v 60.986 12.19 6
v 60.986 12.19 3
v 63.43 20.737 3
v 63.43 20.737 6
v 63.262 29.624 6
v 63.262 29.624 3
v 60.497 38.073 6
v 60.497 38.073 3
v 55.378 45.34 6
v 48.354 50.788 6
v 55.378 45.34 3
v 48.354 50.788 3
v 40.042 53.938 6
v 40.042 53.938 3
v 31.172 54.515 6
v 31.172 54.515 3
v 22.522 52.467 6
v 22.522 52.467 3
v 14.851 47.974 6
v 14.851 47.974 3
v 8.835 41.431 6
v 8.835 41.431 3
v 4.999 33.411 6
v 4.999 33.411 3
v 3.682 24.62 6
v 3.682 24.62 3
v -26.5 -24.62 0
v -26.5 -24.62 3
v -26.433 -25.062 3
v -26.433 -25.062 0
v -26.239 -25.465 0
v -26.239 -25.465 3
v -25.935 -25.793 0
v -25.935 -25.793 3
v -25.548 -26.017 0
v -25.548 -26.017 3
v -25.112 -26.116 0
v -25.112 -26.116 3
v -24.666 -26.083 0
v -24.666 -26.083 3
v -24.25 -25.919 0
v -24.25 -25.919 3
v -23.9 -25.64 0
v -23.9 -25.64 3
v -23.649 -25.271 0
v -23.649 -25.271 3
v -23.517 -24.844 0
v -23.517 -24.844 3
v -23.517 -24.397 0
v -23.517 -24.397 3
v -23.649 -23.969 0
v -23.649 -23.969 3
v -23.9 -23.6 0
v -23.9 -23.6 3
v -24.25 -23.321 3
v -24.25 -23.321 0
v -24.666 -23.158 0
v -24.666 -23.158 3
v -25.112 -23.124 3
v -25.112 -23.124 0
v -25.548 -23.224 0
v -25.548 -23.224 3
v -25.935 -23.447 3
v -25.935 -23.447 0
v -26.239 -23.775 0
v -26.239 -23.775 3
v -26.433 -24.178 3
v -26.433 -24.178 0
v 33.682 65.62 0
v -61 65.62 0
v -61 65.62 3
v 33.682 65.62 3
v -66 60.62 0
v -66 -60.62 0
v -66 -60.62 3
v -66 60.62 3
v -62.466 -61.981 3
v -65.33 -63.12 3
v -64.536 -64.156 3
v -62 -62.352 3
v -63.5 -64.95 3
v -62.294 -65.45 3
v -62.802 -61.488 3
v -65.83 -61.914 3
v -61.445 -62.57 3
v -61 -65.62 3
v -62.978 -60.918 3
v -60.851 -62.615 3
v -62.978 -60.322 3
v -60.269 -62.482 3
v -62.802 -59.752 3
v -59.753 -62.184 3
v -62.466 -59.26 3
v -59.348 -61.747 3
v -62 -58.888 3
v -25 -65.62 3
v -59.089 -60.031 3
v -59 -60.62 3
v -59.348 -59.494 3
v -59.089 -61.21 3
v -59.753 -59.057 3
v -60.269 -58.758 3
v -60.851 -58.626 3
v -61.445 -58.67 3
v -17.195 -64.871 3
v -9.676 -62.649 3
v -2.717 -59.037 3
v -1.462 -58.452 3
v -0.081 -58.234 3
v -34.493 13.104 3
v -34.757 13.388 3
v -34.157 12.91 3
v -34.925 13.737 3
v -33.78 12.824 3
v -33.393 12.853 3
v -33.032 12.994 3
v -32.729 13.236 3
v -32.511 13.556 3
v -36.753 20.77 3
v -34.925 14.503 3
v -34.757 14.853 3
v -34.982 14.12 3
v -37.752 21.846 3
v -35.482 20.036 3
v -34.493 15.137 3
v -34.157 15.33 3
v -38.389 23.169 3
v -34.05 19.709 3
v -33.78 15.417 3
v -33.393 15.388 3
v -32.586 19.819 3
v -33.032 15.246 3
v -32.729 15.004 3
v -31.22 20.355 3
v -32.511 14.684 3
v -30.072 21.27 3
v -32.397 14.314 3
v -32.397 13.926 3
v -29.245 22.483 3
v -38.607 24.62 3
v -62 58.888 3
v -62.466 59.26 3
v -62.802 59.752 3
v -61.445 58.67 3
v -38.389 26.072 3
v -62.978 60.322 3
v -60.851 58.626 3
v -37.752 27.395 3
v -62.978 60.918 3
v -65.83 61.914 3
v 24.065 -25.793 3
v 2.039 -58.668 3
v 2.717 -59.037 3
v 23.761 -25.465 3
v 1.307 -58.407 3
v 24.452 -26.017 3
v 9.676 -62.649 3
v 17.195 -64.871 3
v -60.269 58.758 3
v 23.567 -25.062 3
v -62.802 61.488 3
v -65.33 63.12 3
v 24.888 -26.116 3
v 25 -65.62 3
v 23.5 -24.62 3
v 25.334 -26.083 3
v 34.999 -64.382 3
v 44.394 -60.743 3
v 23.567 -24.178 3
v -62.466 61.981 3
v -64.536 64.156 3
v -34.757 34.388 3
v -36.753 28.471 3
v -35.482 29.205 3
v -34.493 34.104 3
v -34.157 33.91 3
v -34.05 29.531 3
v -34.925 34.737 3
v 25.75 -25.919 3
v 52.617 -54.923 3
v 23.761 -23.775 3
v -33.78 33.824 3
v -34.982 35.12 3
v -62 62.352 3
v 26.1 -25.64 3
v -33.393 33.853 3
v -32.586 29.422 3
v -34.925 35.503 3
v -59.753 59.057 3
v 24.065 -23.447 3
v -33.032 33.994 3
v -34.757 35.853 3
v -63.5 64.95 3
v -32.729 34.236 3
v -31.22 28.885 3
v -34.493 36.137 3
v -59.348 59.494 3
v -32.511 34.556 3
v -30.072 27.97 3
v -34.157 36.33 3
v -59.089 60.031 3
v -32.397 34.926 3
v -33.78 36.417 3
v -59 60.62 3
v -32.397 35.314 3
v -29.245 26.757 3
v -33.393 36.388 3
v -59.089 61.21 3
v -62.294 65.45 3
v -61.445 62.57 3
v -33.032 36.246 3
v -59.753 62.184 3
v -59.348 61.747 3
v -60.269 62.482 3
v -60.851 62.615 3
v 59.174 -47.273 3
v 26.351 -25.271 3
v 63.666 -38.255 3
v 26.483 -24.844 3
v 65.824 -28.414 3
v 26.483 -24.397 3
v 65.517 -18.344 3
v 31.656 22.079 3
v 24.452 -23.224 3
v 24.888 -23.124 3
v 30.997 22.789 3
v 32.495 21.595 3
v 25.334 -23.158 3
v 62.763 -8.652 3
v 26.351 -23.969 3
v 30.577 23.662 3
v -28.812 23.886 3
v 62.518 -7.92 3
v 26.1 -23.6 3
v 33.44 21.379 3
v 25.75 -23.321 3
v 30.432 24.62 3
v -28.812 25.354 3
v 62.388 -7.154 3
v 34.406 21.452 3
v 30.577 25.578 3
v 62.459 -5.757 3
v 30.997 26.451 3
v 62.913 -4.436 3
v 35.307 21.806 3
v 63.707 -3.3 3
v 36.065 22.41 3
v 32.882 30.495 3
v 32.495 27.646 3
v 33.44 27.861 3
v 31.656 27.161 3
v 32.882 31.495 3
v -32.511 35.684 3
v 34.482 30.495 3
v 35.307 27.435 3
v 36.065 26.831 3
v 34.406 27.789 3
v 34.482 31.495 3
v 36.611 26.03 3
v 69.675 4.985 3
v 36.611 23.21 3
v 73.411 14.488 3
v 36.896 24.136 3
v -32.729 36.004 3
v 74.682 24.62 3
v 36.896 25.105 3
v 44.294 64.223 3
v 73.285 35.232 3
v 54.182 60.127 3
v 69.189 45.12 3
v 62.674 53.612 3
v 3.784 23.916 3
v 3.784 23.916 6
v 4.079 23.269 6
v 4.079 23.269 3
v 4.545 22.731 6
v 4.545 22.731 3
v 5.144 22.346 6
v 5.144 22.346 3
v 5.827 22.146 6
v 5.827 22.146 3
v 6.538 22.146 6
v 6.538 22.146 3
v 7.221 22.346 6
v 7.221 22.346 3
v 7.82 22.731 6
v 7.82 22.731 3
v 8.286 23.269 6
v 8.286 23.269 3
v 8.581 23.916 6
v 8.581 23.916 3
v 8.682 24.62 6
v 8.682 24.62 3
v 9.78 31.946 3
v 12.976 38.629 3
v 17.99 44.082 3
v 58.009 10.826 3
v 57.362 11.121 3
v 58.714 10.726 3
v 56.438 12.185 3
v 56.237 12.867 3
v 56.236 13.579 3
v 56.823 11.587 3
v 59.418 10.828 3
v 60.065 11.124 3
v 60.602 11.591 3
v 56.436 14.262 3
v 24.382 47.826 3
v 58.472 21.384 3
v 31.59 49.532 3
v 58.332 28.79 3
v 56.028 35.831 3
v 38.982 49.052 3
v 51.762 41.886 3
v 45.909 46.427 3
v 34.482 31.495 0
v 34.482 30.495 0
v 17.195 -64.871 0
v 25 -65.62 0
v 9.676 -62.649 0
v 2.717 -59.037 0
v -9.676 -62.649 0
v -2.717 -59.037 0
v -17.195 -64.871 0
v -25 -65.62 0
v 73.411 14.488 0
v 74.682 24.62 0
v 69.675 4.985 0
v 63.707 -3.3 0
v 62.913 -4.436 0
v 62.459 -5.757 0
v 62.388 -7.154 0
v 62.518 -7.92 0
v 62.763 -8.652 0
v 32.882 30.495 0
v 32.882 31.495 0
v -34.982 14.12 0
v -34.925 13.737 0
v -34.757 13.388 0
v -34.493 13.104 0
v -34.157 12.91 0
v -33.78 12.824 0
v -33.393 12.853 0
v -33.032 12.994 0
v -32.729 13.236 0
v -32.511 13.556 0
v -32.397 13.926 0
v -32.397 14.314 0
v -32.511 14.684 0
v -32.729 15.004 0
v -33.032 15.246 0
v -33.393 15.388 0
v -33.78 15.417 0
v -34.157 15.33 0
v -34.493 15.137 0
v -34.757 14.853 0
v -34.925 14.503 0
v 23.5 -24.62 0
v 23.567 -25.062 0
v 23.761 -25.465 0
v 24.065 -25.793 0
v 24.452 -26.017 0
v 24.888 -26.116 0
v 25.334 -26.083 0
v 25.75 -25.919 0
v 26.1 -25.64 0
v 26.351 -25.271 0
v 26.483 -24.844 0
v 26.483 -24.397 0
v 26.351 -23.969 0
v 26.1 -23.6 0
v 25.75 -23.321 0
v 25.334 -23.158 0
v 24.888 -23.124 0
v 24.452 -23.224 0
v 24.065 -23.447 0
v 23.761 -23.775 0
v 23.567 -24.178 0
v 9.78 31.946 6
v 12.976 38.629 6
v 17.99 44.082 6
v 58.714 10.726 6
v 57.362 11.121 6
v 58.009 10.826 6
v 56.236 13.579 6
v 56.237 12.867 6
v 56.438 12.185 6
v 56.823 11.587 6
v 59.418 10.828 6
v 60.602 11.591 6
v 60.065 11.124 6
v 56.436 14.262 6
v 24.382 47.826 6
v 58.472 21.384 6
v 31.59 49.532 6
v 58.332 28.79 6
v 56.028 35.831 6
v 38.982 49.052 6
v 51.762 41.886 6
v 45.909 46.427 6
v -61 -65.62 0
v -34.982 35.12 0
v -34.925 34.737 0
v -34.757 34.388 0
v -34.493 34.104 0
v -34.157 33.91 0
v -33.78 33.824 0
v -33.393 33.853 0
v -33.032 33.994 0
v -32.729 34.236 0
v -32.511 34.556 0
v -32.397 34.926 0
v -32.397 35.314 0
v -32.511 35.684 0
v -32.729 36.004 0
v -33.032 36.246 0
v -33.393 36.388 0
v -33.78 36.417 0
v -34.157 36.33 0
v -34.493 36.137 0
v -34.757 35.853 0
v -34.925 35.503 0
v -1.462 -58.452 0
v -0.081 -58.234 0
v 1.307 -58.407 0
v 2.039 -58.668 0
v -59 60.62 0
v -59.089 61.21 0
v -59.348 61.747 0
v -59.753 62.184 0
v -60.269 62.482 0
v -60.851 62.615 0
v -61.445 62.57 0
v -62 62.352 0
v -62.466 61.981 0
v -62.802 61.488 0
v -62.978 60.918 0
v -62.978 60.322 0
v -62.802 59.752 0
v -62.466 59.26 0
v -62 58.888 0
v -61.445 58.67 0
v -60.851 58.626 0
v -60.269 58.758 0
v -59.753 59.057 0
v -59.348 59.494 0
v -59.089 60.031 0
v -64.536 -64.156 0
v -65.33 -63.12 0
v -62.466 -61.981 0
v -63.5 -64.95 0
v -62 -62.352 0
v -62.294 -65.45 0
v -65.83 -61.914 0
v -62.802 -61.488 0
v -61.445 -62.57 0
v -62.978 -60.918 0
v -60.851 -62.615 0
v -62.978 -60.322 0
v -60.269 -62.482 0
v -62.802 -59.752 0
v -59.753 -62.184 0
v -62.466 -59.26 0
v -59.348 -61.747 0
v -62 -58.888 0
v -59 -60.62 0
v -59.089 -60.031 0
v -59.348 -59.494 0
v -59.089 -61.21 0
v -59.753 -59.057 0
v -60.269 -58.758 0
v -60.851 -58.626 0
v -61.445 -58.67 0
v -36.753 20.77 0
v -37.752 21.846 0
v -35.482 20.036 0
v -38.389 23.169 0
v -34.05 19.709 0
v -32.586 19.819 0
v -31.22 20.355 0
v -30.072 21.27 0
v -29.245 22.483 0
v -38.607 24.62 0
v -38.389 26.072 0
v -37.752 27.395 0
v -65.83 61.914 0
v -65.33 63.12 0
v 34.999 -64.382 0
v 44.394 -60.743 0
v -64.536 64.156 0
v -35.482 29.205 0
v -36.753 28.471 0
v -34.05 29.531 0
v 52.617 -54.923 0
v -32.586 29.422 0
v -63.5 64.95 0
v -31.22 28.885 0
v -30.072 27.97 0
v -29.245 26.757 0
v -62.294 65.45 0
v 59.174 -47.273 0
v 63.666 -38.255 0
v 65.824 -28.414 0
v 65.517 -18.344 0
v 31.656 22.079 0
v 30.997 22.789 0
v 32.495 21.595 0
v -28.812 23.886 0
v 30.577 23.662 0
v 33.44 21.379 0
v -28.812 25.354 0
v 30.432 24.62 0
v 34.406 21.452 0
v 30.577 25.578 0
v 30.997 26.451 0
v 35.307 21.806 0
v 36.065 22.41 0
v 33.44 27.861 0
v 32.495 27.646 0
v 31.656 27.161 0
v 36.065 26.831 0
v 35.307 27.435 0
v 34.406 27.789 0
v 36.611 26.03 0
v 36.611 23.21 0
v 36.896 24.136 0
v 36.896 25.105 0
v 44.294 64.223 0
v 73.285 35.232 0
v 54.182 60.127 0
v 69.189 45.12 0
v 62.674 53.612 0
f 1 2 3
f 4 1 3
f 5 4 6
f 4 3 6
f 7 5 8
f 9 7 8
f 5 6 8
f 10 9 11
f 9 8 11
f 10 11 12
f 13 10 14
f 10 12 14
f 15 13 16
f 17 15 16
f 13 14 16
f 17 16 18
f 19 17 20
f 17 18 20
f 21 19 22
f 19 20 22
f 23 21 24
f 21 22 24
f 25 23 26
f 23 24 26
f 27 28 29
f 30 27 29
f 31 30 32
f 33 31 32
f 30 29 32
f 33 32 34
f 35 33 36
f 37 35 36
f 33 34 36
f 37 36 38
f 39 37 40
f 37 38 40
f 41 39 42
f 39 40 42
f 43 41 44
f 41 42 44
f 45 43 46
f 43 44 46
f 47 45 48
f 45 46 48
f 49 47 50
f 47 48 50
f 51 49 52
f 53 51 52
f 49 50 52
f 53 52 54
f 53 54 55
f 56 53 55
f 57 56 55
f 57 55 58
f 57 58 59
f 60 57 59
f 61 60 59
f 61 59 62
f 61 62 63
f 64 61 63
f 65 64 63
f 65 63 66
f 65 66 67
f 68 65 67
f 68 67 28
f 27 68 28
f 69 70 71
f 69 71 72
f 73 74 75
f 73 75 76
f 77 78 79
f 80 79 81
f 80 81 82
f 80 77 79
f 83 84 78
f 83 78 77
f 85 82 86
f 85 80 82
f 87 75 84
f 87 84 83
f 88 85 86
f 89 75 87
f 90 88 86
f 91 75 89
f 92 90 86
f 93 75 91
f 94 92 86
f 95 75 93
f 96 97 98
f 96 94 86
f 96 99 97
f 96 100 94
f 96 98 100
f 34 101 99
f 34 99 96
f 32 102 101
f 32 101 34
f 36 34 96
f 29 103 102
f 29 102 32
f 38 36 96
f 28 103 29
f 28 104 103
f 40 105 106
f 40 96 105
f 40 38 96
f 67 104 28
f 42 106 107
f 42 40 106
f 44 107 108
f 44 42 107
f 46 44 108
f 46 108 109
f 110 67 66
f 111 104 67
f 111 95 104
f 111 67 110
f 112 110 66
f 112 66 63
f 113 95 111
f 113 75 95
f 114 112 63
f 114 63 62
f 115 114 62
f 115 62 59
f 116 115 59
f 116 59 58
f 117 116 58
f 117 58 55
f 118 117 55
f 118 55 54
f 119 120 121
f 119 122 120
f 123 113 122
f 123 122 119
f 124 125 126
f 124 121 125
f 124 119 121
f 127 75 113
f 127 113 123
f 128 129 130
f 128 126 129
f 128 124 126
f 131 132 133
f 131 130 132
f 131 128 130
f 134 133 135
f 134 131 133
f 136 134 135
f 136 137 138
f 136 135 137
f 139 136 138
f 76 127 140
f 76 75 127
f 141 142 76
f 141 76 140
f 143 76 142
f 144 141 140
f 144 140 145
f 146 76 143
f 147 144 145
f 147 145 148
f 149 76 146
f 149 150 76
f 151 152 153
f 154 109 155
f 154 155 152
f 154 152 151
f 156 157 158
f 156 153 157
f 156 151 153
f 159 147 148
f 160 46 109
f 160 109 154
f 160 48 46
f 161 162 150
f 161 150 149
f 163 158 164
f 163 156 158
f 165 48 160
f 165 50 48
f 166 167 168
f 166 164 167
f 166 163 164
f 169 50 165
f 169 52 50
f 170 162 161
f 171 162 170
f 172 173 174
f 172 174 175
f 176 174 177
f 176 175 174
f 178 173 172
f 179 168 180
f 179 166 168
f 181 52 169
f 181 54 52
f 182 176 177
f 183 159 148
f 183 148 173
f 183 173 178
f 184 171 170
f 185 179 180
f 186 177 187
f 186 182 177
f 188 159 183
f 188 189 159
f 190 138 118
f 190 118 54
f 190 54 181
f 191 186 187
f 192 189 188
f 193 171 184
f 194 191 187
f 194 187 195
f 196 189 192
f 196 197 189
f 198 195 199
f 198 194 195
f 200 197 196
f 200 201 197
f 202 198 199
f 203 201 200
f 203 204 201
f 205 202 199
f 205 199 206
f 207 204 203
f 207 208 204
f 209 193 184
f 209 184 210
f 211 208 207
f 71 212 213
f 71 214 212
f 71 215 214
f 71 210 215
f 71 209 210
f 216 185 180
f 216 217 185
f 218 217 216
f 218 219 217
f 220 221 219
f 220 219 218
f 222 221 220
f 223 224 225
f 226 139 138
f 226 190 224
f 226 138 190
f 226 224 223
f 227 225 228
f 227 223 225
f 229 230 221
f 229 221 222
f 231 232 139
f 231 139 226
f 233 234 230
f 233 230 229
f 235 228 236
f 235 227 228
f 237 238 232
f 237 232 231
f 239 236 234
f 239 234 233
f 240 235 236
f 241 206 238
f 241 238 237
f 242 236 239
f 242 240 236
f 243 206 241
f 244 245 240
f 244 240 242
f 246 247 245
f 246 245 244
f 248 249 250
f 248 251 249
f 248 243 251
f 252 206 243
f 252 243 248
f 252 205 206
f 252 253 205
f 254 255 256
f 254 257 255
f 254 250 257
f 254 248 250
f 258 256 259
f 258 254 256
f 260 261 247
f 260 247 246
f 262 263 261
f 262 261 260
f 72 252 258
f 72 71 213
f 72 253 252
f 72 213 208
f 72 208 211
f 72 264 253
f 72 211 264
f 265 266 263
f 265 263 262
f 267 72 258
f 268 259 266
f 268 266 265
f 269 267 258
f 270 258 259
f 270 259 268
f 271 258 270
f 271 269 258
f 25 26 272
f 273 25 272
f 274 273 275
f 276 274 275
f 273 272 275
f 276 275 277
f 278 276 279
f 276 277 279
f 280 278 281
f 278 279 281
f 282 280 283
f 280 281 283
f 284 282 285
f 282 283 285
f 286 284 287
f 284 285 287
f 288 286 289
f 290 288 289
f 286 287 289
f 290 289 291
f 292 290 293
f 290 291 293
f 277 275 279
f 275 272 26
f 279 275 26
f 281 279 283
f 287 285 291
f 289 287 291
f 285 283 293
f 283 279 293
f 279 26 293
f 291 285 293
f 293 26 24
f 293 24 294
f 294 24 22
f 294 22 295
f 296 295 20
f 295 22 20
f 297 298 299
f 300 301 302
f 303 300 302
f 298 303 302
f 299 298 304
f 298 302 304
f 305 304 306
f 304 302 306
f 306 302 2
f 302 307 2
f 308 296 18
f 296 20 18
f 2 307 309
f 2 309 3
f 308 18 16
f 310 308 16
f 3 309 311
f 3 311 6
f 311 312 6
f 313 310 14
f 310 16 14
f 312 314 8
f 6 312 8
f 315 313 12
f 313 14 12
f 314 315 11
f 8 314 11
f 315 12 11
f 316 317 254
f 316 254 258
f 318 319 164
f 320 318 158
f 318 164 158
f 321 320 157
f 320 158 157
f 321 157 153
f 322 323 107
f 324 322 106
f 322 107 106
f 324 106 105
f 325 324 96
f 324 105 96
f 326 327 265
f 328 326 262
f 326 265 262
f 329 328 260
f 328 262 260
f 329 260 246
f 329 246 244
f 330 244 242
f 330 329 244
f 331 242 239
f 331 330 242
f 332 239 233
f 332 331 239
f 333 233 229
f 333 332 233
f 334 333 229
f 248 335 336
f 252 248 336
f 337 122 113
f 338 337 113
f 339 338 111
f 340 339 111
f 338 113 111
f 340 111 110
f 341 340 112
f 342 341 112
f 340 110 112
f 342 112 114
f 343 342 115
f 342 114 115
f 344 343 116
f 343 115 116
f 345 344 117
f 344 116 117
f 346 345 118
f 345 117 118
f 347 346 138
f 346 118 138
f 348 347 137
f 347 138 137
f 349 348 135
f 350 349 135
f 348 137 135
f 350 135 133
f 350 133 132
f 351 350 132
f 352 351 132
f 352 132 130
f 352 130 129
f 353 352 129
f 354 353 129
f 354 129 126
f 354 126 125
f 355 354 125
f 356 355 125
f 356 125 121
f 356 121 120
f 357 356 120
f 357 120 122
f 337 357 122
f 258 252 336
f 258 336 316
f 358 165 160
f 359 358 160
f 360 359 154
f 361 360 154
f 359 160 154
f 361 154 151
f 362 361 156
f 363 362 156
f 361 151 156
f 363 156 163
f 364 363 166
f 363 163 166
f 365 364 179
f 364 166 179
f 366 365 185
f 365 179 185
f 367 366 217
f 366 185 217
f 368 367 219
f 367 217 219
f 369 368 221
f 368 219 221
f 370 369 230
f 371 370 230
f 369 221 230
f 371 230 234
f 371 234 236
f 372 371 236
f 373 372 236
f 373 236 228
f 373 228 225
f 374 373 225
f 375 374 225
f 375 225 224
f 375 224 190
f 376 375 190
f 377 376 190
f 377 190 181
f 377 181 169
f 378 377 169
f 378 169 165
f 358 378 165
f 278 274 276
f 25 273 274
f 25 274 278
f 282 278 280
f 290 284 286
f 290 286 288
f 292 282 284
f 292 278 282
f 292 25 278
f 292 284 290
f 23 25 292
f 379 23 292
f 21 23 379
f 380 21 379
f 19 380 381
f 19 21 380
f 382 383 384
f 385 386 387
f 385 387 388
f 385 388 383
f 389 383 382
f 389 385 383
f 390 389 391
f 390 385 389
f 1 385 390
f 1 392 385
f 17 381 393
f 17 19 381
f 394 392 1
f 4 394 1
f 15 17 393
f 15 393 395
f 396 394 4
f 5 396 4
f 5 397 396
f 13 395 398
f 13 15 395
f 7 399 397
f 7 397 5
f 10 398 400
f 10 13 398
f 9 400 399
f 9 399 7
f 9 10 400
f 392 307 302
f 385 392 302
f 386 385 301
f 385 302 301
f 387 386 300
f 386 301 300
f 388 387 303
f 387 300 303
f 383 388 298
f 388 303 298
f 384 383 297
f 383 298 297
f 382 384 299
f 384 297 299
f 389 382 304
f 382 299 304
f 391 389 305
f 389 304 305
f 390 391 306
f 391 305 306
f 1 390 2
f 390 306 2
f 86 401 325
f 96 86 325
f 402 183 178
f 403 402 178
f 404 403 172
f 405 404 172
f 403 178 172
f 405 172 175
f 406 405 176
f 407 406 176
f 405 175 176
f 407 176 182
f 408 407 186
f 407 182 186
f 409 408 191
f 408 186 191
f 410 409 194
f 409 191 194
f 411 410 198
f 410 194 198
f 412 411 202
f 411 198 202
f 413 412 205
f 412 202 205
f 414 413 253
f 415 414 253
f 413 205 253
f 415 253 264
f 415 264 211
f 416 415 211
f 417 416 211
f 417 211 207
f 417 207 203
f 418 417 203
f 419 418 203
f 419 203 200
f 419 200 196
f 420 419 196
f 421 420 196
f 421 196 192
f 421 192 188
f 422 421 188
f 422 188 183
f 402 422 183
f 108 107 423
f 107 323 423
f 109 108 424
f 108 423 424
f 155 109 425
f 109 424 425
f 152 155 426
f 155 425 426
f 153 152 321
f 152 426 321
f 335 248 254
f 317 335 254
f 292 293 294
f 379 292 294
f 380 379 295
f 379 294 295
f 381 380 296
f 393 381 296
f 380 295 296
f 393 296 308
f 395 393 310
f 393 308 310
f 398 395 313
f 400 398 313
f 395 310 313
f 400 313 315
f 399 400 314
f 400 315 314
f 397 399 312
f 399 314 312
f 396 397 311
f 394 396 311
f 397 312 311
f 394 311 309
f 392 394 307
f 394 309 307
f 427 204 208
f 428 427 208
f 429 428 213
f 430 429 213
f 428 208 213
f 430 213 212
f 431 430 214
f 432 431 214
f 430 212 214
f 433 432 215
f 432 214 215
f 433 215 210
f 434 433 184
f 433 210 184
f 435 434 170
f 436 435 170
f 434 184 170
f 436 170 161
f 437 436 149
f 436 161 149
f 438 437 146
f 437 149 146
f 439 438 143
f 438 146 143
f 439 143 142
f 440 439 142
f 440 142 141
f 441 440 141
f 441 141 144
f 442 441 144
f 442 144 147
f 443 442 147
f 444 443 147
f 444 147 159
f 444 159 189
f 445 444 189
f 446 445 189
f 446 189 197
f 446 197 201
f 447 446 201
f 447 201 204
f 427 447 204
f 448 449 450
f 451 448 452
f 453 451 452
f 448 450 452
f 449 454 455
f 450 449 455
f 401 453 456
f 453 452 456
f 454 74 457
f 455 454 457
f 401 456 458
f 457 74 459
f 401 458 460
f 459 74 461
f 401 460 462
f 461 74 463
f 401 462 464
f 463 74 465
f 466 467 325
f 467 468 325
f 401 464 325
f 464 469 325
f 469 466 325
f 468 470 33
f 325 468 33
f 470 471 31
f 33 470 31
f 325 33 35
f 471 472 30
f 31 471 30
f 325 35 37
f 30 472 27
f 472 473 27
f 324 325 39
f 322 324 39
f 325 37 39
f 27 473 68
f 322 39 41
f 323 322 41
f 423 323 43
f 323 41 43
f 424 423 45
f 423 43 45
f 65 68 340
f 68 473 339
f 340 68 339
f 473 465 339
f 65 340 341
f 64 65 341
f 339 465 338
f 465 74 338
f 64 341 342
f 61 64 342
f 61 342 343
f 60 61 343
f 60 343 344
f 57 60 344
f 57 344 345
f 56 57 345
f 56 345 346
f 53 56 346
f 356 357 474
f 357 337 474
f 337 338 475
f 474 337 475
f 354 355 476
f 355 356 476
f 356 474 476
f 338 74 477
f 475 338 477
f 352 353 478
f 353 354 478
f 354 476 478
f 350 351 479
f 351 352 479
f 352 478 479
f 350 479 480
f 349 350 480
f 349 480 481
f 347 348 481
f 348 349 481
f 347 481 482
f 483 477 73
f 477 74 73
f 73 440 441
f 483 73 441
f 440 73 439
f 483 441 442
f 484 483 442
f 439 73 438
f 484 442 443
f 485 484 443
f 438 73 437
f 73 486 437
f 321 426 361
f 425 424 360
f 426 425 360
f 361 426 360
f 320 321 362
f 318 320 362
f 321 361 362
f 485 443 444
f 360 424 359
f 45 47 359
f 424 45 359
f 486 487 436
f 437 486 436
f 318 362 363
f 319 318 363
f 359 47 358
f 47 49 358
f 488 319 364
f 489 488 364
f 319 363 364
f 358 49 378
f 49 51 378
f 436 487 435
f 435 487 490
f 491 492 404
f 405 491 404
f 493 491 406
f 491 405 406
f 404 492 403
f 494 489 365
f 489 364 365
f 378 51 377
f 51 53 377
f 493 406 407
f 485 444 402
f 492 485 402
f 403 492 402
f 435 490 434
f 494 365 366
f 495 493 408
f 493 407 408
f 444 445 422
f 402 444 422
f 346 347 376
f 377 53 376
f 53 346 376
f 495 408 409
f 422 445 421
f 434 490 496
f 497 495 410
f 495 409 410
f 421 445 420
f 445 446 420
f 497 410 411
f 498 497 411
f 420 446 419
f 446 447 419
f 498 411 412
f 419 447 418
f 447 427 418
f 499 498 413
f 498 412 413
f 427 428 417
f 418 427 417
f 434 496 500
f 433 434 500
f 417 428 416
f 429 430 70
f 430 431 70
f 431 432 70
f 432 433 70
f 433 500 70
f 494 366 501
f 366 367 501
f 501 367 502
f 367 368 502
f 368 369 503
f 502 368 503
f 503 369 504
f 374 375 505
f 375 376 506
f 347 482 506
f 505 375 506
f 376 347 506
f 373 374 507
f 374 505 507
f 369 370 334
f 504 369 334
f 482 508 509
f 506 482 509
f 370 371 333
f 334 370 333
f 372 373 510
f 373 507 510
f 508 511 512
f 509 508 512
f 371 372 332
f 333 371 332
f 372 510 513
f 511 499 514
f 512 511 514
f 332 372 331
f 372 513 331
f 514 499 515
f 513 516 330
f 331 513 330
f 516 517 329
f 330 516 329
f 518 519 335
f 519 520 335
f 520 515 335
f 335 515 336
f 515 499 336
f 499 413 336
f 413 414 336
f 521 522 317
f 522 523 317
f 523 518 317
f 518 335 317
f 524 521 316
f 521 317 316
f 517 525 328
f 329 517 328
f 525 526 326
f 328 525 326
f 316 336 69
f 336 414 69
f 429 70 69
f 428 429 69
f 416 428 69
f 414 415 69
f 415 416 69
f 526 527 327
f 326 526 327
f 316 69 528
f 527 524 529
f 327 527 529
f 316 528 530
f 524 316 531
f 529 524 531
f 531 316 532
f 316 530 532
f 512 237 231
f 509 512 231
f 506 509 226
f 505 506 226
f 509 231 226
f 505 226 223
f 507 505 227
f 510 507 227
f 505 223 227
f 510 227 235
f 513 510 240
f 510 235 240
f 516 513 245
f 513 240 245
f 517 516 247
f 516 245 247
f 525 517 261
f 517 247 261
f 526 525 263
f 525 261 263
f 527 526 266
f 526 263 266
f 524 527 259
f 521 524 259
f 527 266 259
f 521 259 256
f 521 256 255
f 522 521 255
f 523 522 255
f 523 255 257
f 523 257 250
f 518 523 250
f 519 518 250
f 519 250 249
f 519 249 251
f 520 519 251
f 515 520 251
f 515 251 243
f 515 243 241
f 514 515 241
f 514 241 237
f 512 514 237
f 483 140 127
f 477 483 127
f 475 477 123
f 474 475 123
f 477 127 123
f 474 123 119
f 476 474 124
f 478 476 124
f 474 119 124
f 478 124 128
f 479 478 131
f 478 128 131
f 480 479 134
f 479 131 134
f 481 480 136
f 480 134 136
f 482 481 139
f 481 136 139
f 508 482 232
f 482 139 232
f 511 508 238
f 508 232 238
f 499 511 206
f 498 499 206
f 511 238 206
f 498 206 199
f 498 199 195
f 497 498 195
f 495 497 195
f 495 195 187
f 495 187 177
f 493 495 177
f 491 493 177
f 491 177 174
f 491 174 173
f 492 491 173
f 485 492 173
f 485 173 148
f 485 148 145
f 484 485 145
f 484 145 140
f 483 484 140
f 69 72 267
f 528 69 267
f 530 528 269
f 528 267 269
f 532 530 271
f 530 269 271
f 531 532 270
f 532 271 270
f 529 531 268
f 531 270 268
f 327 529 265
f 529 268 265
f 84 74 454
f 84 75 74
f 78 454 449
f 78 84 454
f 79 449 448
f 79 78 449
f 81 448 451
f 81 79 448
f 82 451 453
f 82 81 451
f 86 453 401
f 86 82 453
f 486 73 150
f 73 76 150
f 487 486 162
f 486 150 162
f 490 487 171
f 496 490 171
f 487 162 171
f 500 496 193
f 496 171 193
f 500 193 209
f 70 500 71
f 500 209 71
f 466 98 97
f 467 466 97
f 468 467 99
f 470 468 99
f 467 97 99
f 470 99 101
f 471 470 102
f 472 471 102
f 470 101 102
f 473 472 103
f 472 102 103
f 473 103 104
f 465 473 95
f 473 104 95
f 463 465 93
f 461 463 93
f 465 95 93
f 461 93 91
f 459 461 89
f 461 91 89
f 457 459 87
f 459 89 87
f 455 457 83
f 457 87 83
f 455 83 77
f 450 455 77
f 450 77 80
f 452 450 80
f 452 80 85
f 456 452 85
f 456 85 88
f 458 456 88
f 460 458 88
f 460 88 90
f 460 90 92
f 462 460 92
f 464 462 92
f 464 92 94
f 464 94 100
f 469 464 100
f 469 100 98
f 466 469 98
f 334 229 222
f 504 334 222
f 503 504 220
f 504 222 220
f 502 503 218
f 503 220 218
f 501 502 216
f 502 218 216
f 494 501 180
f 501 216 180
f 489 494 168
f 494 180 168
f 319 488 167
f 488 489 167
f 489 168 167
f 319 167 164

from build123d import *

# Parameters (mm, degrees)
F3_W      = 140.6824088833
F3_H      = 131.2403876506
F3_W_2    = 1.6
F3_H_2    = 1
F4_DEPTH  = 3
F5_D      = 9.85
F6_D      = 6.5
F7_D      = 2.6
F8_D      = 3
F9_R      = 2
F10_DEPTH = 3.001
F11_R     = 5
F13_DEPTH = 3


with BuildPart() as f4:
    # F3 (on Top) → F4 (new body)
    with BuildSketch(Plane.XY):
        with Locations((4.3412044417, 0)):
            Rectangle(F3_W, F3_H)
        with Locations((33.6824088833, 30.9951938253)):
            Rectangle(F3_W_2, F3_H_2, mode=Mode.SUBTRACT)
    extrude(amount=F4_DEPTH)

    # F5 (through all)
    with Locations(Plane(origin=(0, 0, 0), x_dir=(1, 0, 0), z_dir=(0, 0, -1))):
        with Locations((-33.6824088833, -24.6201938253)):
            Hole(F5_D / 2)

    # F6 (through all)
    with Locations(Plane(origin=(0, 0, 0), x_dir=(1, 0, 0), z_dir=(0, 0, -1))):
        with Locations((33.6824088833, -24.6201938253)):
            Hole(F6_D / 2)

    # F7 (through all)
    with Locations(Plane(origin=(0, 0, 0), x_dir=(1, 0, 0), z_dir=(0, 0, -1))):
        with Locations((-33.6824088833, -14.1201938253), (-33.6824088833, -35.1201938253)):
            Hole(F7_D / 2)

    # F8 (through all)
    with Locations(Plane(origin=(0, 0, 0), x_dir=(1, 0, 0), z_dir=(0, 0, -1))):
        with Locations((-25, 24.6201938253), (25, 24.6201938253)):
            Hole(F8_D / 2)

    # F9 (on face) → F10 (cut, through all)
    with BuildSketch(Plane.XY.offset(3)):
        with BuildLine():
            ThreePointArc((33.6824088833, 65.6201938253), (62.6737868311, 53.6115719349), (74.6824088833, 24.6201940542))
            Line((74.6824088833, 24.6201940542), (74.6824088833, 65.6201938253))
            Line((74.6824088833, 65.6201938253), (33.6824088833, 65.6201938253))
        make_face()
        with BuildLine():
            ThreePointArc((61.3436684683, -5.642897857), (60.0647196959, -45.8679097649), (25, -65.6201938253))
            Line((25, -65.6201938253), (74.6824088833, -65.6201938253))
            Line((74.6824088833, -65.6201938253), (74.6824088833, 24.6201940542))
            ThreePointArc((74.6824088833, 24.6201940542), (71.1998158427, 8.084046298), (61.3436684683, -5.642897857))
        make_face()
        with BuildLine():
            ThreePointArc((0, -57.1163474438), (-11.7966348676, -63.4360559075), (-25, -65.6201938253))
            Line((-25, -65.6201938253), (25, -65.6201938253))
            ThreePointArc((25, -65.6201938253), (11.7966348676, -63.4360559075), (0, -57.1163474438))
        make_face()
        with Locations((-61, -60.6201938253)):
            Circle(F9_R)
        with Locations((-61, 60.6201938253)):
            Circle(F9_R)
    extrude(amount=-F10_DEPTH, mode=Mode.SUBTRACT)

    # F11
    f11_edges = [f4.edges().sort_by_distance(p)[0] for p in [
        (0, -57.116347, 1.5),
        (61.343668, -5.642898, 1.5),
        (-66, -65.620194, 1.5),
        (-66, 65.620194, 1.5),
    ]]
    fillet(f11_edges, radius=F11_R)


with BuildPart() as f13:
    # F12 (on face) → F13 (new body)
    with BuildSketch(Plane.XY.offset(3)):
        with BuildLine():
            ThreePointArc((3.6824088833, 24.6201938253), (6.1824088833, 22.1201938253), (8.6824088833, 24.6201938253))
            ThreePointArc((8.6824088833, 24.6201938253), (38.9820562112, 49.0520119771), (56.4355079394, 14.2617922427))
            ThreePointArc((56.4355079394, 14.2617922427), (57.6749776867, 10.9506421788), (60.9861277506, 12.1901119262))
            ThreePointArc((60.9861277506, 12.1901119262), (40.0419856768, 53.9383756074), (3.6824088833, 24.6201938253))
        make_face()
    extrude(amount=F13_DEPTH)


solid = Compound([f4.part, f13.part])
